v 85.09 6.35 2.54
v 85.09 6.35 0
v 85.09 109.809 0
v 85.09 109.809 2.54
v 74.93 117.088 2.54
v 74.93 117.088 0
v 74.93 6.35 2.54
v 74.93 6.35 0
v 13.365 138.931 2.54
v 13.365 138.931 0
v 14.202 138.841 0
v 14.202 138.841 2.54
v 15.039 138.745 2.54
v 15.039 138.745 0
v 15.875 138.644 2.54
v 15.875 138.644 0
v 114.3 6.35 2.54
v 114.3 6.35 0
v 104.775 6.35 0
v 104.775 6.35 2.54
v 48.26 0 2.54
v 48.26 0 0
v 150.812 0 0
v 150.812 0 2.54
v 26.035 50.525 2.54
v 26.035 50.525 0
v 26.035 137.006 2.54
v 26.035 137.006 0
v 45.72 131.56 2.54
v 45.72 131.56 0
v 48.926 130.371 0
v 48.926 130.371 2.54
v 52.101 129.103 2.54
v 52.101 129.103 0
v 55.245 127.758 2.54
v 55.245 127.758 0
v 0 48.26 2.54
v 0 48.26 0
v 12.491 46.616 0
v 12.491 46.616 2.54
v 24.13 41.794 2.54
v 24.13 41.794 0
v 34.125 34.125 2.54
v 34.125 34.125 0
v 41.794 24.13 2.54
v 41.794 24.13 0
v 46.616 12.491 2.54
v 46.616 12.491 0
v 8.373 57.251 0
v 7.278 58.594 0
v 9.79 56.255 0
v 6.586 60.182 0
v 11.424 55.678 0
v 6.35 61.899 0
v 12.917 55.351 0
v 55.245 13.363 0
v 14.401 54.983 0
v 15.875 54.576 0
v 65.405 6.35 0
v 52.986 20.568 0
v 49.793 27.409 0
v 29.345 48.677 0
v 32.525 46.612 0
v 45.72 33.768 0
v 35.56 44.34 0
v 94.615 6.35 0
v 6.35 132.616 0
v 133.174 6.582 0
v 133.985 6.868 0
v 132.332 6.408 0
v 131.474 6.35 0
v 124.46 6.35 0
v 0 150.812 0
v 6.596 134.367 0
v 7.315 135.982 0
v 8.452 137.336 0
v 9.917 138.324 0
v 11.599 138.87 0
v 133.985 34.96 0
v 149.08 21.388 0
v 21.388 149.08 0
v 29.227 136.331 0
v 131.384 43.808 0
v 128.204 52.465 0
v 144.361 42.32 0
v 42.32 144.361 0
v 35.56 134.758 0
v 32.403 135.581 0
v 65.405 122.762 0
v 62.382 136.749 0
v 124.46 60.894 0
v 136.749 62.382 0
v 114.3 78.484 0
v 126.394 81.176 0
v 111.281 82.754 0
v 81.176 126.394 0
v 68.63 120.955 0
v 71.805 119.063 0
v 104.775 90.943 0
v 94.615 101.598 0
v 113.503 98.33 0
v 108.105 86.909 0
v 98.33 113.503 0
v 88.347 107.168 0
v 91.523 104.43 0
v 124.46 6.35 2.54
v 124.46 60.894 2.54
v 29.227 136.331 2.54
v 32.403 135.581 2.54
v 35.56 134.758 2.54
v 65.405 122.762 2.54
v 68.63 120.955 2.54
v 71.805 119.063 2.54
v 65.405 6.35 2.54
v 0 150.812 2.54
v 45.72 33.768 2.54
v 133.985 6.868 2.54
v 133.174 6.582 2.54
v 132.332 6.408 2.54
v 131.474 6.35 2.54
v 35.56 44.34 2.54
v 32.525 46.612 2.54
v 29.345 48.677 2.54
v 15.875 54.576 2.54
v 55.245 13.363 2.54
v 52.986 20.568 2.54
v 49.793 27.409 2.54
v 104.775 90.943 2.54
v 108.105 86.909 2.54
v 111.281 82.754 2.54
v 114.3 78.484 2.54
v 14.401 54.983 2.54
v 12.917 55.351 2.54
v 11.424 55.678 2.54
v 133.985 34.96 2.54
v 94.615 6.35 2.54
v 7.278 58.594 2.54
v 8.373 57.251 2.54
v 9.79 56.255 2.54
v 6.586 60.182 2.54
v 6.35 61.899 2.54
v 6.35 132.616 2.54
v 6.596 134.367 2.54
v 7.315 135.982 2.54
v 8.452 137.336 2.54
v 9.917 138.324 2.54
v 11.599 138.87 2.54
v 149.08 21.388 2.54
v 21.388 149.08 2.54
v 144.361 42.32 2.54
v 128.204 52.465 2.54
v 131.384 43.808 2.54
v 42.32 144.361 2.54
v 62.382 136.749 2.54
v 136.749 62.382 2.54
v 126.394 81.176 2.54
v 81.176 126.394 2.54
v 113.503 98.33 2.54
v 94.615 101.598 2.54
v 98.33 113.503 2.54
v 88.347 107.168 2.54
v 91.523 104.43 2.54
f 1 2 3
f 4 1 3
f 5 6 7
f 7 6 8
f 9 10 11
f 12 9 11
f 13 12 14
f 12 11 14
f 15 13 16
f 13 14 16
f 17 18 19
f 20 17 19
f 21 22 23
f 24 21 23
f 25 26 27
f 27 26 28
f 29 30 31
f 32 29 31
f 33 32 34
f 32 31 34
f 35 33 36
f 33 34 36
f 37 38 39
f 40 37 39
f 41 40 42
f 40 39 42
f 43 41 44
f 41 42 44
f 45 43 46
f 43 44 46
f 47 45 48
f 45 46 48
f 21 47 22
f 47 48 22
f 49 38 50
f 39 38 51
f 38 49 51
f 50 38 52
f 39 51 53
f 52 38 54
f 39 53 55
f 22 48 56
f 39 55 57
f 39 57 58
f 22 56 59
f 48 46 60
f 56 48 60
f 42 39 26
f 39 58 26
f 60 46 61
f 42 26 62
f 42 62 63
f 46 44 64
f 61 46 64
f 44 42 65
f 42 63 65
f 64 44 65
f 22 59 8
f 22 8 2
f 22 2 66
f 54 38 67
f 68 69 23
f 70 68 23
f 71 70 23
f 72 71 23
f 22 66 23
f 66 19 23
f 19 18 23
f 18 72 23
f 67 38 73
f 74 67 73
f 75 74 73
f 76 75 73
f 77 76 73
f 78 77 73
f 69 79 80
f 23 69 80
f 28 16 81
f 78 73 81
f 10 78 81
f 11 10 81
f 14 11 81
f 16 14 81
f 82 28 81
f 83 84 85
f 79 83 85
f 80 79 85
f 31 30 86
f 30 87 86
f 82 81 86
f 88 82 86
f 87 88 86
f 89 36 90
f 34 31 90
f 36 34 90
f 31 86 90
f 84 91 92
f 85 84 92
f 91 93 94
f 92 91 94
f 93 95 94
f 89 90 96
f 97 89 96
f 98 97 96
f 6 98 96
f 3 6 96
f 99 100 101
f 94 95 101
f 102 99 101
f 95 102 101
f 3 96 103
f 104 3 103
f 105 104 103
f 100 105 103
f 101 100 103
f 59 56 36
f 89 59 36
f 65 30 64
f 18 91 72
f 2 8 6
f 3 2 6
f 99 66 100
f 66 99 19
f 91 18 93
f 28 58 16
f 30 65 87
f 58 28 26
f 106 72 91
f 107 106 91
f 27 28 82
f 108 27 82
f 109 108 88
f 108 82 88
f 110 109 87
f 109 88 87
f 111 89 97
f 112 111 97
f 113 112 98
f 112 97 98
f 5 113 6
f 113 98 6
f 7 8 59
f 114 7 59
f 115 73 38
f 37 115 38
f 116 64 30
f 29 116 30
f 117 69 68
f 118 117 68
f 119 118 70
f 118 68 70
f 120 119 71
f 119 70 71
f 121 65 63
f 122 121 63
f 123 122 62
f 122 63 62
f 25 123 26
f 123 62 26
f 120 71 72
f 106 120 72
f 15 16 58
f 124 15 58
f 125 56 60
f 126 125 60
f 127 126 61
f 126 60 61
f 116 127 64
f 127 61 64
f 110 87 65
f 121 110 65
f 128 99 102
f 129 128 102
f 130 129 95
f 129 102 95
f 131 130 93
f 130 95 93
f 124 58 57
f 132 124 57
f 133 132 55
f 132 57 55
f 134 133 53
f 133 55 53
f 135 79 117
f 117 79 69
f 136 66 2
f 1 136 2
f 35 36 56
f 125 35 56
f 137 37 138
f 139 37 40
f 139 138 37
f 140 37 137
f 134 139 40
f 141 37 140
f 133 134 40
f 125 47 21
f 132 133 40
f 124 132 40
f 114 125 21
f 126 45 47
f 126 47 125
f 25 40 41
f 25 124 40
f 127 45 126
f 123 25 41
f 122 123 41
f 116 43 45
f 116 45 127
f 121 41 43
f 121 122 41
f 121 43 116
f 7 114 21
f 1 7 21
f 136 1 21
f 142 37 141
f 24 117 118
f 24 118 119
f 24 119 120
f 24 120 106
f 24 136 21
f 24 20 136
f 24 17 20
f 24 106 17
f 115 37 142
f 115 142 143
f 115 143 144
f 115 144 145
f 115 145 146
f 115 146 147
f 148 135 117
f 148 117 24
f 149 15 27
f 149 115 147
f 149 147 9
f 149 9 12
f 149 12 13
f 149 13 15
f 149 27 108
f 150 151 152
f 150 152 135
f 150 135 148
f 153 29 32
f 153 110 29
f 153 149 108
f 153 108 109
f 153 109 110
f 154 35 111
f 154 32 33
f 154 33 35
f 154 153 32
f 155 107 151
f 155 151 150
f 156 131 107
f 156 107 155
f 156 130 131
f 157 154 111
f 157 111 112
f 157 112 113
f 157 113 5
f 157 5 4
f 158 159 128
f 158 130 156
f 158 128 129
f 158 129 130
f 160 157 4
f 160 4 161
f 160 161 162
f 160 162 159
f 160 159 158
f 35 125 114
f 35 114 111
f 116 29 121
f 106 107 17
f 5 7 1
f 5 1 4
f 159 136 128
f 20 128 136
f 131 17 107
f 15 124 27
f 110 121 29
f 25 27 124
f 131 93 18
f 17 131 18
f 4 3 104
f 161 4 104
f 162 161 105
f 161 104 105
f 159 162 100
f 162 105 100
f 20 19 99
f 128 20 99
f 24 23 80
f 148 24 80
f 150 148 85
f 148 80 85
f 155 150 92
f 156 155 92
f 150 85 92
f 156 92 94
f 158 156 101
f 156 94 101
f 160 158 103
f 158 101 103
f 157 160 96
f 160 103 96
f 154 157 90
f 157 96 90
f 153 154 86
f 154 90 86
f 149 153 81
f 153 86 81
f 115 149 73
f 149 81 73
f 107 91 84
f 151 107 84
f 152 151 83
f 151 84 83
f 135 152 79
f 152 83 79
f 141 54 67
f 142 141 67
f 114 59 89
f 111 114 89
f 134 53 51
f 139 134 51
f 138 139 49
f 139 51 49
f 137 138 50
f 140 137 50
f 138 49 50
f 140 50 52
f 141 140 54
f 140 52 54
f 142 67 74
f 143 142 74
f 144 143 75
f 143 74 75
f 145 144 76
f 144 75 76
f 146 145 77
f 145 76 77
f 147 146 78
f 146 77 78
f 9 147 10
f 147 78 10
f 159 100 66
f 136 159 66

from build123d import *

# Parameters (mm, degrees)
F1_DEPTH = 2.54


with BuildPart() as f1:
    # F0 (on Top) → F1 (new body)
    with BuildSketch(Plane.XY):
        with BuildLine():
            ThreePointArc((0, 48.26), (34.124973, 34.124973), (48.26, 0))
            Line((48.26, 0), (150.8125, 0))
            ThreePointArc((150.8125, 0), (106.183757, 106.183757), (0, 150.8125))
            Line((0, 150.8125), (0, 48.26))
        make_face()
        with BuildLine():
            Line((55.245, 127.75815), (55.245, 13.362749))
            ThreePointArc((55.245, 13.362749), (51.503135, 24.041635), (45.72, 33.767657))
            Line((45.72, 33.767657), (45.72, 131.559986))
            ThreePointArc((45.72, 131.559986), (50.517399, 129.746504), (55.245, 127.75815))
        make_face(mode=Mode.SUBTRACT)
        with BuildLine():
            Line((74.93, 6.35), (65.405, 6.35))
            Line((65.405, 6.35), (65.405, 122.762105))
            ThreePointArc((65.405, 122.762105), (70.223809, 120.019687), (74.93, 117.088215))
            Line((74.93, 117.088215), (74.93, 6.35))
        make_face(mode=Mode.SUBTRACT)
        with BuildLine():
            ThreePointArc((124.46, 60.893818), (129.865191, 48.162763), (133.985, 34.959619))
            Line((133.985, 34.959619), (133.985, 6.867618))
            ThreePointArc((133.985, 6.867618), (132.755827, 6.480751), (131.47386, 6.35))
            Line((131.47386, 6.35), (124.46, 6.35))
            Line((124.46, 6.35), (124.46, 60.893818))
        make_face(mode=Mode.SUBTRACT)
        with BuildLine():
            Line((104.775, 6.35), (104.775, 90.942553))
            ThreePointArc((104.775, 90.942553), (109.712471, 84.84681), (114.3, 78.483534))
            Line((114.3, 78.483534), (114.3, 6.35))
            Line((114.3, 6.35), (104.775, 6.35))
        make_face(mode=Mode.SUBTRACT)
        with BuildLine():
            Line((94.615, 6.35), (85.09, 6.35))
            Line((85.09, 6.35), (85.09, 109.809109))
            ThreePointArc((85.09, 109.809109), (89.944941, 105.810796), (94.615, 101.598016))
            Line((94.615, 101.598016), (94.615, 6.35))
        make_face(mode=Mode.SUBTRACT)
        with BuildLine():
            ThreePointArc((35.56, 44.340269), (30.952351, 47.671009), (26.035, 50.524765))
            Line((26.035, 50.524765), (26.035, 137.005573))
            ThreePointArc((26.035, 137.005573), (30.81719, 135.965077), (35.56, 134.757713))
            Line((35.56, 134.757713), (35.56, 44.340269))
        make_face(mode=Mode.SUBTRACT)
        with BuildLine():
            ThreePointArc((11.423732, 55.678285), (7.779289, 57.885092), (6.35, 61.898706))
            Line((6.35, 61.898706), (6.35, 132.616219))
            ThreePointArc((6.35, 132.616219), (8.451575, 137.335688), (13.365238, 138.931277))
            ThreePointArc((13.365238, 138.931277), (14.620769, 138.793276), (15.875, 138.643929))
            Line((15.875, 138.643929), (15.875, 54.576162))
            ThreePointArc((15.875, 54.576162), (13.660485, 55.172133), (11.423732, 55.678285))
        make_face(mode=Mode.SUBTRACT)
    extrude(amount=F1_DEPTH)


solid = f1.part
